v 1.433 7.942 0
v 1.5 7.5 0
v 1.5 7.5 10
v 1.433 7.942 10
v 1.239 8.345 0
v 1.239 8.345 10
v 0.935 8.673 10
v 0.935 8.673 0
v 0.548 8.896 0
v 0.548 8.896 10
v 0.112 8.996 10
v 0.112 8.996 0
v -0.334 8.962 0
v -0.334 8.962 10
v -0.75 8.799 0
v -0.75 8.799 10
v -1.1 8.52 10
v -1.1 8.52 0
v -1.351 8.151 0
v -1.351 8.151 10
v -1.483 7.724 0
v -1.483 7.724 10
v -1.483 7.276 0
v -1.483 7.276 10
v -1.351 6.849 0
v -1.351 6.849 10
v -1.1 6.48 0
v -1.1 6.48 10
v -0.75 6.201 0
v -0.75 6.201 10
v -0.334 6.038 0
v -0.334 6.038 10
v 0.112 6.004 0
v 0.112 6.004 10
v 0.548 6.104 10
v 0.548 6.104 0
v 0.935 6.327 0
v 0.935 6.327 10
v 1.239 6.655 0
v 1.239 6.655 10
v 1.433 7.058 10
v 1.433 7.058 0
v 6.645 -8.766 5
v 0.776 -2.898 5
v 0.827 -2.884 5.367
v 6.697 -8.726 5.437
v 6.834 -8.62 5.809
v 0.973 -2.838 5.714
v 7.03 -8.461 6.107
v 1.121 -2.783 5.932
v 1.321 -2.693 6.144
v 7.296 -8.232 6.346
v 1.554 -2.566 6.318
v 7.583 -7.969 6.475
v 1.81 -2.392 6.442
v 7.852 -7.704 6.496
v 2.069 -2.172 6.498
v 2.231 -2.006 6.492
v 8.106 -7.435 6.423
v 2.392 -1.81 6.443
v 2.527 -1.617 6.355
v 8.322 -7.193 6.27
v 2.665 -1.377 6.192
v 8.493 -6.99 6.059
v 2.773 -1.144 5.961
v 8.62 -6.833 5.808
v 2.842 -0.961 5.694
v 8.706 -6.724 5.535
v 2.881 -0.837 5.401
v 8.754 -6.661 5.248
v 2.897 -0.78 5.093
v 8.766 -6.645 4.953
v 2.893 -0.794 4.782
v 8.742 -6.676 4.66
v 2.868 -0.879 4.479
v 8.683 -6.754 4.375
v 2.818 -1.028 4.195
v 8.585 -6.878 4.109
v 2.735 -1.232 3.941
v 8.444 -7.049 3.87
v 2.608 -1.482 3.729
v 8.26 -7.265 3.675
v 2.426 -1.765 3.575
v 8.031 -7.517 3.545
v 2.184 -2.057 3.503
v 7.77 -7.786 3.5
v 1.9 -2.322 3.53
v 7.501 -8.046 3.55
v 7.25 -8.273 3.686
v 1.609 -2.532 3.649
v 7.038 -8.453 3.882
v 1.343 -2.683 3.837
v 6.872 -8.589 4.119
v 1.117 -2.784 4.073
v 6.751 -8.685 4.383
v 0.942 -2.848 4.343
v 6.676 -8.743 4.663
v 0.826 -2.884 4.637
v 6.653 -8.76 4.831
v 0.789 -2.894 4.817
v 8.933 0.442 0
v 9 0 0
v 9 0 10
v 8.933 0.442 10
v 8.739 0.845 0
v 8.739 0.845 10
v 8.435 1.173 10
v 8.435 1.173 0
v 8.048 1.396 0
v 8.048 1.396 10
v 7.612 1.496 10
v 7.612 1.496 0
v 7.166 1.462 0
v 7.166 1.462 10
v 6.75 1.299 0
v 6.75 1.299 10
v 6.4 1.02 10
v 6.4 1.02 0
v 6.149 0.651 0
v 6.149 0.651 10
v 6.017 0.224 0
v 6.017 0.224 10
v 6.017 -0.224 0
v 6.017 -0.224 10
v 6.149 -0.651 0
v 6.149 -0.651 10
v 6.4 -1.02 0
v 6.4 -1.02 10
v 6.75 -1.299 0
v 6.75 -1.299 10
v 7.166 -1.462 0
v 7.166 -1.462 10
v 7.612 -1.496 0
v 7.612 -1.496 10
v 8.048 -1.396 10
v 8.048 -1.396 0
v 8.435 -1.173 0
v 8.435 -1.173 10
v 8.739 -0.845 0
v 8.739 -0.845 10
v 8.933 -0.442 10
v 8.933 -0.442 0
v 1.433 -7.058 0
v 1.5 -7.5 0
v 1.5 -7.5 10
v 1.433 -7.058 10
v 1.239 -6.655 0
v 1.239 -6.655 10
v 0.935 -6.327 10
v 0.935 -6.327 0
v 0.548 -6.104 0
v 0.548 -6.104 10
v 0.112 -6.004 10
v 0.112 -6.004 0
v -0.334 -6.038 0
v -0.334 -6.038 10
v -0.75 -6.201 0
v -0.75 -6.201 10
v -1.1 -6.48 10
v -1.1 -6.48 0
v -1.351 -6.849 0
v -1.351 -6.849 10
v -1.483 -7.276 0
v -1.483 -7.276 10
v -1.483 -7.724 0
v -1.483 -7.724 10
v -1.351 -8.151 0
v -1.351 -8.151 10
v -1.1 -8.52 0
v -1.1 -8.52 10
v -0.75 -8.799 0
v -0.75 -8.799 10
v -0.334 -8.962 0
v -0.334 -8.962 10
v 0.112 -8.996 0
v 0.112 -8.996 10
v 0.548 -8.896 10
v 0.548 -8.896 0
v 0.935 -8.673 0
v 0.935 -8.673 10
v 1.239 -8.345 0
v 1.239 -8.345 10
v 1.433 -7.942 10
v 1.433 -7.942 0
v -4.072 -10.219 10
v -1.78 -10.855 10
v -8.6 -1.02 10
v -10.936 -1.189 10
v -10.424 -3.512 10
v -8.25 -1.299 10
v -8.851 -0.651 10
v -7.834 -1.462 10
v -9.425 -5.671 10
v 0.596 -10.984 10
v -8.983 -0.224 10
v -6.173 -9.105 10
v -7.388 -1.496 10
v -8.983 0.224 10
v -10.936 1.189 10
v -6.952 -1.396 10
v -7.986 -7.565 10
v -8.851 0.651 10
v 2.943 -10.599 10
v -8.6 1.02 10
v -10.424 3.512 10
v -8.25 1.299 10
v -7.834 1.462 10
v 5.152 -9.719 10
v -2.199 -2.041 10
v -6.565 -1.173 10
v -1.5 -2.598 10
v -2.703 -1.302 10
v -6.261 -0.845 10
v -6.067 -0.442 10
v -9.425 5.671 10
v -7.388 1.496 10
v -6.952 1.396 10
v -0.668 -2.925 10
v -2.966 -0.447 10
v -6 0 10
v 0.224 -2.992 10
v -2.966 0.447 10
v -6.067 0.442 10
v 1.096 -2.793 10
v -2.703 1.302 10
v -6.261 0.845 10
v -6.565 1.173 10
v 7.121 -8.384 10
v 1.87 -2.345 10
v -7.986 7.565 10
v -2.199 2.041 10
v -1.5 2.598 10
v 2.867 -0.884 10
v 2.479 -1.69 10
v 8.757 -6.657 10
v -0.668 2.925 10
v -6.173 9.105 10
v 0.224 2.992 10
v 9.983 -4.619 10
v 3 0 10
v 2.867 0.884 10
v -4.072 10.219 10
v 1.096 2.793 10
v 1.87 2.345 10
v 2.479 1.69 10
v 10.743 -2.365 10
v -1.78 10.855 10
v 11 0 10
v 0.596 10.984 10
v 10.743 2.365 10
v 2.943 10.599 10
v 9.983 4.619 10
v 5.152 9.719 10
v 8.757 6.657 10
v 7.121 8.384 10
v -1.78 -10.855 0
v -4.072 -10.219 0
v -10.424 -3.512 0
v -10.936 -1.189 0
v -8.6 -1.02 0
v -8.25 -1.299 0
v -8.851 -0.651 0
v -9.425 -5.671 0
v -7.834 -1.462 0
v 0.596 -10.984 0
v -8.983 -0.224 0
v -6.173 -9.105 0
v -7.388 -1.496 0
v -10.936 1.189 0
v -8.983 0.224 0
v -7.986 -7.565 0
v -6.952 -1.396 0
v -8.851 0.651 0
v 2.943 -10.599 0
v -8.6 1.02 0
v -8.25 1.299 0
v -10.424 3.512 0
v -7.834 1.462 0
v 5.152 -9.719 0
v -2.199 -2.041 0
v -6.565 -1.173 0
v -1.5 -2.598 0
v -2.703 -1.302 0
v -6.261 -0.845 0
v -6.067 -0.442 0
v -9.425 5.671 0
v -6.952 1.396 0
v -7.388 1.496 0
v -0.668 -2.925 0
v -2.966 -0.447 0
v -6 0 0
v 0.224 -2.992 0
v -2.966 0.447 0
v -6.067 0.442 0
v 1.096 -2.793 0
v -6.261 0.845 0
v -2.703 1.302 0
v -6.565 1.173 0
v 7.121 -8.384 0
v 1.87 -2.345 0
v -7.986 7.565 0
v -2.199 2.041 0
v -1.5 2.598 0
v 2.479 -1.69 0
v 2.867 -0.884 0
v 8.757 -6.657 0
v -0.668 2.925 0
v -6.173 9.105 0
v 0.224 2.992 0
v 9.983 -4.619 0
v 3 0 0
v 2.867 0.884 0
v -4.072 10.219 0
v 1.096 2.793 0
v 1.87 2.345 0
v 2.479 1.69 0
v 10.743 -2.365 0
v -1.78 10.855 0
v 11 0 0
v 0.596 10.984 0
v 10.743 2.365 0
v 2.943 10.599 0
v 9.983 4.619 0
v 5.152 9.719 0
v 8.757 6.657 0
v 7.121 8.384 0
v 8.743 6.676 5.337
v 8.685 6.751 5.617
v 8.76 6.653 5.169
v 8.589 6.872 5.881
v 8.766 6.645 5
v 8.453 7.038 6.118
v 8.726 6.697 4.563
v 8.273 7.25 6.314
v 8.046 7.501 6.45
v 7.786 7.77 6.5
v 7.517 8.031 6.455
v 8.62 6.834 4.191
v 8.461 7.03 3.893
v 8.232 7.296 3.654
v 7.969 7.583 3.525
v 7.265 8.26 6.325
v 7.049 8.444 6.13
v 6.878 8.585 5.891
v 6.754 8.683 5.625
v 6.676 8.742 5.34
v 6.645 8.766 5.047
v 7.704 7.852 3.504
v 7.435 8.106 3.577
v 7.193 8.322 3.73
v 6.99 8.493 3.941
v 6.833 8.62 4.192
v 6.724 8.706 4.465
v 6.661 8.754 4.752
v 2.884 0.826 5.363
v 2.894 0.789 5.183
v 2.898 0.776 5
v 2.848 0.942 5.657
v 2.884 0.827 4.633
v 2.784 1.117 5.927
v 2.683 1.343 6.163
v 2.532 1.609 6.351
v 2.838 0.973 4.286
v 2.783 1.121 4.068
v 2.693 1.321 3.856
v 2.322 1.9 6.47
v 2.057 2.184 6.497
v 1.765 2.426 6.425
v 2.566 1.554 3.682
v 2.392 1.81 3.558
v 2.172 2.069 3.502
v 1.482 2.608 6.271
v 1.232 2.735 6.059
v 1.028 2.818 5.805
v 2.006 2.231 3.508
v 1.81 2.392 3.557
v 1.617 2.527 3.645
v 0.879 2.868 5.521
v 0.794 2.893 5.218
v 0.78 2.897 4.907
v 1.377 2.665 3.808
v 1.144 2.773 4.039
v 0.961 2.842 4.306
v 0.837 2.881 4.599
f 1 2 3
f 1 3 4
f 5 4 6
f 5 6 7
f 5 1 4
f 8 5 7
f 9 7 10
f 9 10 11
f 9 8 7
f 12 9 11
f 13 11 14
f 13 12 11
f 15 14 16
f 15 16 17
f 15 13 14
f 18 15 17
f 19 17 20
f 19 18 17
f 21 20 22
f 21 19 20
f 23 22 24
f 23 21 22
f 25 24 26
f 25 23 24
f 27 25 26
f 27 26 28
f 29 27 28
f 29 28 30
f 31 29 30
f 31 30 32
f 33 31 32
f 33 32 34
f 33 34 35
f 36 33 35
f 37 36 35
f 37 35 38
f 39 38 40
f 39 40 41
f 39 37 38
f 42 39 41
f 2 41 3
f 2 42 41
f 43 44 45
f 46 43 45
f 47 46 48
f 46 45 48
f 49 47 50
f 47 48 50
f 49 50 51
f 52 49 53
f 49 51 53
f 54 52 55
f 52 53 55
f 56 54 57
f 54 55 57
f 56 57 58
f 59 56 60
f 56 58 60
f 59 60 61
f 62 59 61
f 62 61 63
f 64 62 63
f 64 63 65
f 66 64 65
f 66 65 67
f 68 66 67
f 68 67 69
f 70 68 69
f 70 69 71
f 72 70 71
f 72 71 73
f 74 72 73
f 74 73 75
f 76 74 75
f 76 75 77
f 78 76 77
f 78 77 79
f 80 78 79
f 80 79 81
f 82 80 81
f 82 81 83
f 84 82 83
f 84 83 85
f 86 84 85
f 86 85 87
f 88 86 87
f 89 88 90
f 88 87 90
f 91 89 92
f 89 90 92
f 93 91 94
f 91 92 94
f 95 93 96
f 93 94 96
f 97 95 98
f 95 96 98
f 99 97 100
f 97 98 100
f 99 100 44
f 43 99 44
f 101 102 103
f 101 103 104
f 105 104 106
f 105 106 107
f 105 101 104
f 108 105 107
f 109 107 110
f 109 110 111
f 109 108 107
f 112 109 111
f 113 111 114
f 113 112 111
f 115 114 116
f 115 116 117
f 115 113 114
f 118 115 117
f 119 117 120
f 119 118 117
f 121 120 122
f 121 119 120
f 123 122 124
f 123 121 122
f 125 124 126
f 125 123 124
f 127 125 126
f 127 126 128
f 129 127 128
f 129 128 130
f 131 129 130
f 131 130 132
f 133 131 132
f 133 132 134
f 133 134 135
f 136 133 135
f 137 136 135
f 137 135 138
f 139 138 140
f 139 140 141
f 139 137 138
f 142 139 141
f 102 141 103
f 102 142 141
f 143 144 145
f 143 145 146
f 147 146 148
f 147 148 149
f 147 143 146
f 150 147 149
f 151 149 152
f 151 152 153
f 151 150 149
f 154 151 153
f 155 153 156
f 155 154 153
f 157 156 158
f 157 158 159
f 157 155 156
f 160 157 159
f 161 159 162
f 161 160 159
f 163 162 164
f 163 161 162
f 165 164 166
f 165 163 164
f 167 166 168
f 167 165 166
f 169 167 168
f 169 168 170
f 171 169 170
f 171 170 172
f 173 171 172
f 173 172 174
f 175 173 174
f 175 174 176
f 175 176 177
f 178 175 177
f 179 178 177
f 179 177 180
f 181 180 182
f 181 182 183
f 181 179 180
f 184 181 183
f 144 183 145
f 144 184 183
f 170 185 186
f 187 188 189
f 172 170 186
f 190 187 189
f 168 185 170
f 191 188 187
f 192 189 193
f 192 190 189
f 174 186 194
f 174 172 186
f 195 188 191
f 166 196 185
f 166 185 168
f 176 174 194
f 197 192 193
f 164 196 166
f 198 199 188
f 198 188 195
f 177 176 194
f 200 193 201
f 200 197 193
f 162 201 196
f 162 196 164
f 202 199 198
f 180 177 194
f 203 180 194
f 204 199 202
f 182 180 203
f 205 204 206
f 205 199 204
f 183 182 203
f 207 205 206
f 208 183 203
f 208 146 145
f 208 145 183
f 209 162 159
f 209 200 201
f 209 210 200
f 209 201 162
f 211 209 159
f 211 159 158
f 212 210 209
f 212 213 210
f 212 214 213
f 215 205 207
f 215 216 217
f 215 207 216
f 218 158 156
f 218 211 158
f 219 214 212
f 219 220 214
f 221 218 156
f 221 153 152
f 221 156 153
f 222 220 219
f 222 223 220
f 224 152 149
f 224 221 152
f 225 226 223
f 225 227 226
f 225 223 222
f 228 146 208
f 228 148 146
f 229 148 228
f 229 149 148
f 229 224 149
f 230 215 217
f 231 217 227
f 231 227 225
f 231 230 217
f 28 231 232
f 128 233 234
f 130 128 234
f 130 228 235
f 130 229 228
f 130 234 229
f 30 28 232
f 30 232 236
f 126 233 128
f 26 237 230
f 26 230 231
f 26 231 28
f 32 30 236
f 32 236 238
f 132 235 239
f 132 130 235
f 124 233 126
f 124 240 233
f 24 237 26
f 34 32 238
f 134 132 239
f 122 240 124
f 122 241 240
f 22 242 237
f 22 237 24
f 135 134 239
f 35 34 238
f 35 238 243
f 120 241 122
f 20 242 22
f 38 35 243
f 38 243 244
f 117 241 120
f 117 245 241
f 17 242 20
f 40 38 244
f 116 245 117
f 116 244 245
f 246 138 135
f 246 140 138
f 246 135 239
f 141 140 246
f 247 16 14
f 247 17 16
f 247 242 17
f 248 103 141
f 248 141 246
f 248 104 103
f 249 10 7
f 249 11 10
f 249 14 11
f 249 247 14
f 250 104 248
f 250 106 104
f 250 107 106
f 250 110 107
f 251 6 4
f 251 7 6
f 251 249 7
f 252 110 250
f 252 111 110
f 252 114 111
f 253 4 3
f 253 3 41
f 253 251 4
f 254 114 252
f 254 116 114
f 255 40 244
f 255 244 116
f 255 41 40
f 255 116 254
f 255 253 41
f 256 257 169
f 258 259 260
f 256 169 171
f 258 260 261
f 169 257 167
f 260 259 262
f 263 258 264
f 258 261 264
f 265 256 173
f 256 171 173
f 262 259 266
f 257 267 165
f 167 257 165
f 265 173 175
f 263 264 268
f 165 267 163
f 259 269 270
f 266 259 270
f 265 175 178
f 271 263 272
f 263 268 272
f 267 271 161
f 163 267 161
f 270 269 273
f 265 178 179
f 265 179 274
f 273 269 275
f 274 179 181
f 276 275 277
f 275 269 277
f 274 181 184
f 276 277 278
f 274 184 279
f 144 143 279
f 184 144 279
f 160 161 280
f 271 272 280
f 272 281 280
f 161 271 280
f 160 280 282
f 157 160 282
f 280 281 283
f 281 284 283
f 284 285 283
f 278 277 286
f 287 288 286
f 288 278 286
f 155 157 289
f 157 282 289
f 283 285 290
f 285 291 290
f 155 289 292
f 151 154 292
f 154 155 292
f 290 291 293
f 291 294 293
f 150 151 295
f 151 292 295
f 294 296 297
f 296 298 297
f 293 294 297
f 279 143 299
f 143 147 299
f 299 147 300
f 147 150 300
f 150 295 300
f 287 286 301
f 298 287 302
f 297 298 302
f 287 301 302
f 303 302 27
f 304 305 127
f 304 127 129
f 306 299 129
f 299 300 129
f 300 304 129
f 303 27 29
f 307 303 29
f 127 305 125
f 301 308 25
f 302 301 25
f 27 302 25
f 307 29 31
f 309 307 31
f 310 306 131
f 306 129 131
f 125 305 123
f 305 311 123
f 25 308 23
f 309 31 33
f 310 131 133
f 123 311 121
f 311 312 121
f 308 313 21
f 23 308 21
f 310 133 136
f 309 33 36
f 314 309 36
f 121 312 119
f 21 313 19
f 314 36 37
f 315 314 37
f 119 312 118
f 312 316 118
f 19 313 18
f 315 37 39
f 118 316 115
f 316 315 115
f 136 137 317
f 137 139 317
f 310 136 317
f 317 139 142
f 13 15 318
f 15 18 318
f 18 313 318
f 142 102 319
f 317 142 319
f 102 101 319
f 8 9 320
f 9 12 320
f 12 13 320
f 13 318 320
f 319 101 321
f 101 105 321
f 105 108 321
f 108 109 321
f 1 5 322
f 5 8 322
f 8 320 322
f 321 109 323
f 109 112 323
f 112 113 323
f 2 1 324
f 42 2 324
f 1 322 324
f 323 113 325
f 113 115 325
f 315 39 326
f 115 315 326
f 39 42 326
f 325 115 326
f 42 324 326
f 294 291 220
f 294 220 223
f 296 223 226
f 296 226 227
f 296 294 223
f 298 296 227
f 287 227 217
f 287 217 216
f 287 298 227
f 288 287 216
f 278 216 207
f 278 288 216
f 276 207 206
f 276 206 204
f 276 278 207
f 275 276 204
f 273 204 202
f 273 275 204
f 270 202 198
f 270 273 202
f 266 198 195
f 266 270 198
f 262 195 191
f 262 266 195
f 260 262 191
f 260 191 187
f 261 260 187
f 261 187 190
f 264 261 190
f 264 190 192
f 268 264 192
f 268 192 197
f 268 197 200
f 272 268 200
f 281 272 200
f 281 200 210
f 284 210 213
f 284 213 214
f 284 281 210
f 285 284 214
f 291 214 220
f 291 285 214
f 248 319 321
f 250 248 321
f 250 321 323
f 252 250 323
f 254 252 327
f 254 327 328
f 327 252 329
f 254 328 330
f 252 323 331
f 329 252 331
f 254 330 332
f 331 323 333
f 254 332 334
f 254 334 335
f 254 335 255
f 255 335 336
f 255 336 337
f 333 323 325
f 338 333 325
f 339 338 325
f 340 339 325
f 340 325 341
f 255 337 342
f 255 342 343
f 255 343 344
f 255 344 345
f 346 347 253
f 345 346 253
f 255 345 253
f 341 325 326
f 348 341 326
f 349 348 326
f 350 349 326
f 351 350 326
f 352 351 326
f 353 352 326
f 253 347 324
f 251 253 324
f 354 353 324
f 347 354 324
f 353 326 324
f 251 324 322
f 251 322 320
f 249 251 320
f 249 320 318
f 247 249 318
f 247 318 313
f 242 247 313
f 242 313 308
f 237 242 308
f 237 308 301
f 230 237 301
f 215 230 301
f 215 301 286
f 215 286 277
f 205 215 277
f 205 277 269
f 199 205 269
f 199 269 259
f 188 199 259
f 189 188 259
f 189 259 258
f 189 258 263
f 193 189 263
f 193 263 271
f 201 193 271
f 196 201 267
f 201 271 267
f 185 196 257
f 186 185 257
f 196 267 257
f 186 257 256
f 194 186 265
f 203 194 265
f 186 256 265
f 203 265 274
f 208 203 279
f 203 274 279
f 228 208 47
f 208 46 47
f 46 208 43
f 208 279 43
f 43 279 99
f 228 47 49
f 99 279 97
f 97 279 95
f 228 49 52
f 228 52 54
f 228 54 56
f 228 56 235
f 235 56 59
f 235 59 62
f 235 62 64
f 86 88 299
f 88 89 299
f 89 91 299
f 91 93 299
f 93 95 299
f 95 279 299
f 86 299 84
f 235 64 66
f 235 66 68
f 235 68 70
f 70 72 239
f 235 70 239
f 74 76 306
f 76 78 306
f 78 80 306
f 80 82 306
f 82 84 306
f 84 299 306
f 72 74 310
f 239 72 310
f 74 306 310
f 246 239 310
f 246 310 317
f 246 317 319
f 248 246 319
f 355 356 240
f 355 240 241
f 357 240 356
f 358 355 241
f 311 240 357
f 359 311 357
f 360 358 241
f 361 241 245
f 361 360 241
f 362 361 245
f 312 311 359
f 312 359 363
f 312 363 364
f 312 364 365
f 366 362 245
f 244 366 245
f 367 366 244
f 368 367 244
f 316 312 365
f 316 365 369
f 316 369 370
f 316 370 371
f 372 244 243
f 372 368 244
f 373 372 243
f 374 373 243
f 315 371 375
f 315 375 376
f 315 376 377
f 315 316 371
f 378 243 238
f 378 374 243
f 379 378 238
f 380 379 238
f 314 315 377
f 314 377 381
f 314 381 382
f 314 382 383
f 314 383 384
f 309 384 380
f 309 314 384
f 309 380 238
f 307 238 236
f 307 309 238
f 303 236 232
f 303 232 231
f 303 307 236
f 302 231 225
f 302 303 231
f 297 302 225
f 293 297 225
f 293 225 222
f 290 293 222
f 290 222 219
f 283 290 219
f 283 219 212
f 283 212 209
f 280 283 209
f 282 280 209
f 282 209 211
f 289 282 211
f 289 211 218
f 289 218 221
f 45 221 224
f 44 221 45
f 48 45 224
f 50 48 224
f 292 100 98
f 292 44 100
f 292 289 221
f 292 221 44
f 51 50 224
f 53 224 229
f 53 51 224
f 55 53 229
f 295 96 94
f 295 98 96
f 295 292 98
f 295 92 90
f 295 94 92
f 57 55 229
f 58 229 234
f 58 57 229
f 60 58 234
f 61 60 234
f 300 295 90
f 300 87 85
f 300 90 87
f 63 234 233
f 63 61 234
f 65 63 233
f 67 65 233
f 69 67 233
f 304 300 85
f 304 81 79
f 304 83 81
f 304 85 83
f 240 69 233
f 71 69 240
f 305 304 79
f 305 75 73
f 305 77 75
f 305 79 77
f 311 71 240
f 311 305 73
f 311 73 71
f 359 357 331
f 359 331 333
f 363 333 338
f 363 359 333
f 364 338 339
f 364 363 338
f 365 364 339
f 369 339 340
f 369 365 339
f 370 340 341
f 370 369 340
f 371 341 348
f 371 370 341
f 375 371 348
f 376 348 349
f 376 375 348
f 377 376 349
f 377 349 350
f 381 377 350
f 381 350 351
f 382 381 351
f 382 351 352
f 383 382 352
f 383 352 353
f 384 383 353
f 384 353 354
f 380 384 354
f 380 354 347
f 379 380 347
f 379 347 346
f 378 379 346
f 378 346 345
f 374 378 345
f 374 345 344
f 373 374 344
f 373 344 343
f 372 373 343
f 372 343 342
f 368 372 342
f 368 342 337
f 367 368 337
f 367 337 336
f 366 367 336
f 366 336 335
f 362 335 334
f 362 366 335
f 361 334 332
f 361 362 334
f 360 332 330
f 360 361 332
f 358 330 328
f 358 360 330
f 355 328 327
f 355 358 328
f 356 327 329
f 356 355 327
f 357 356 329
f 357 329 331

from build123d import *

# Parameters (mm, degrees)
SKETCH_1_R               = 11
SKETCH_1_R_2             = 3
SKETCH_1_R_3             = 1.5
EXTRUDE_1_DEPTH          = 10
CUT_EXTRUDE_1_REACH      = 20.493
CUT_EXTRUDE_1_END_RADIUS = 11
SKETCH_2_R               = 1.5
CUT_EXTRUDE_2_REACH      = 20.493
CUT_EXTRUDE_2_END_RADIUS = 11
SKETCH_3_R               = 1.5


with BuildPart() as part:
    # ｽｹｯﾁ1 → ﾎﾞｽ - 押し出し1 (new body)
    with BuildSketch(Plane.XY):
        Circle(SKETCH_1_R)
        Circle(SKETCH_1_R_2, mode=Mode.SUBTRACT)
        with Locations((-7.5, 0)):
            Circle(SKETCH_1_R_3, mode=Mode.SUBTRACT)
        with Locations((7.5, 0)):
            Circle(SKETCH_1_R_3, mode=Mode.SUBTRACT)
        with Locations((0, 7.5)):
            Circle(SKETCH_1_R_3, mode=Mode.SUBTRACT)
        with Locations((0, -7.5)):
            Circle(SKETCH_1_R_3, mode=Mode.SUBTRACT)
    extrude(amount=EXTRUDE_1_DEPTH)

    # ｶｯﾄ - 押し出し1: up to this cylinder (the profile starts inside it)
    cut_extrude_1_end = Plane(origin=(0, 0, 5), z_dir=(0, 0, -1)) * Cylinder(CUT_EXTRUDE_1_END_RADIUS, 63.986, mode=Mode.PRIVATE)
    # ｽｹｯﾁ2 → ｶｯﾄ - 押し出し1 (cut, up to the surface)
    with BuildSketch(Plane(origin=(0, 0, 0), x_dir=(0.7071067811865477, -0.7071067811865475, 0), z_dir=(0.7071067811865475, 0.7071067811865477, 0)), mode=Mode.PRIVATE) as cut_extrude_1_sk1:
        with Locations((0, -5)):
            Circle(SKETCH_2_R)
    cut_extrude_1_tool1 = extrude(cut_extrude_1_sk1.sketch, amount=CUT_EXTRUDE_1_REACH, mode=Mode.PRIVATE) & cut_extrude_1_end
    add(cut_extrude_1_tool1.solids().sort_by_distance((0, 0, 5))[0], mode=Mode.SUBTRACT)

    # ｶｯﾄ - 押し出し2: up to this cylinder (the profile starts inside it)
    cut_extrude_2_end = Plane(origin=(0, 0, 5), z_dir=(0, 0, -1)) * Cylinder(CUT_EXTRUDE_2_END_RADIUS, 63.986, mode=Mode.PRIVATE)
    # ｽｹｯﾁ3 → ｶｯﾄ - 押し出し2 (cut, up to the surface)
    with BuildSketch(Plane(origin=(0, 0, 0), x_dir=(0.7071067811865477, 0.7071067811865475, 0), z_dir=(-0.7071067811865475, 0.7071067811865477, 0)), mode=Mode.PRIVATE) as cut_extrude_2_sk1:
        with Locations(Location((0, -5, 0), (0, 0, 180))):
            Circle(SKETCH_3_R)
    cut_extrude_2_tool1 = extrude(cut_extrude_2_sk1.sketch, amount=-CUT_EXTRUDE_2_REACH, mode=Mode.PRIVATE) & cut_extrude_2_end
    add(cut_extrude_2_tool1.solids().sort_by_distance((0, 0, 5))[0], mode=Mode.SUBTRACT)


solid = part.part
